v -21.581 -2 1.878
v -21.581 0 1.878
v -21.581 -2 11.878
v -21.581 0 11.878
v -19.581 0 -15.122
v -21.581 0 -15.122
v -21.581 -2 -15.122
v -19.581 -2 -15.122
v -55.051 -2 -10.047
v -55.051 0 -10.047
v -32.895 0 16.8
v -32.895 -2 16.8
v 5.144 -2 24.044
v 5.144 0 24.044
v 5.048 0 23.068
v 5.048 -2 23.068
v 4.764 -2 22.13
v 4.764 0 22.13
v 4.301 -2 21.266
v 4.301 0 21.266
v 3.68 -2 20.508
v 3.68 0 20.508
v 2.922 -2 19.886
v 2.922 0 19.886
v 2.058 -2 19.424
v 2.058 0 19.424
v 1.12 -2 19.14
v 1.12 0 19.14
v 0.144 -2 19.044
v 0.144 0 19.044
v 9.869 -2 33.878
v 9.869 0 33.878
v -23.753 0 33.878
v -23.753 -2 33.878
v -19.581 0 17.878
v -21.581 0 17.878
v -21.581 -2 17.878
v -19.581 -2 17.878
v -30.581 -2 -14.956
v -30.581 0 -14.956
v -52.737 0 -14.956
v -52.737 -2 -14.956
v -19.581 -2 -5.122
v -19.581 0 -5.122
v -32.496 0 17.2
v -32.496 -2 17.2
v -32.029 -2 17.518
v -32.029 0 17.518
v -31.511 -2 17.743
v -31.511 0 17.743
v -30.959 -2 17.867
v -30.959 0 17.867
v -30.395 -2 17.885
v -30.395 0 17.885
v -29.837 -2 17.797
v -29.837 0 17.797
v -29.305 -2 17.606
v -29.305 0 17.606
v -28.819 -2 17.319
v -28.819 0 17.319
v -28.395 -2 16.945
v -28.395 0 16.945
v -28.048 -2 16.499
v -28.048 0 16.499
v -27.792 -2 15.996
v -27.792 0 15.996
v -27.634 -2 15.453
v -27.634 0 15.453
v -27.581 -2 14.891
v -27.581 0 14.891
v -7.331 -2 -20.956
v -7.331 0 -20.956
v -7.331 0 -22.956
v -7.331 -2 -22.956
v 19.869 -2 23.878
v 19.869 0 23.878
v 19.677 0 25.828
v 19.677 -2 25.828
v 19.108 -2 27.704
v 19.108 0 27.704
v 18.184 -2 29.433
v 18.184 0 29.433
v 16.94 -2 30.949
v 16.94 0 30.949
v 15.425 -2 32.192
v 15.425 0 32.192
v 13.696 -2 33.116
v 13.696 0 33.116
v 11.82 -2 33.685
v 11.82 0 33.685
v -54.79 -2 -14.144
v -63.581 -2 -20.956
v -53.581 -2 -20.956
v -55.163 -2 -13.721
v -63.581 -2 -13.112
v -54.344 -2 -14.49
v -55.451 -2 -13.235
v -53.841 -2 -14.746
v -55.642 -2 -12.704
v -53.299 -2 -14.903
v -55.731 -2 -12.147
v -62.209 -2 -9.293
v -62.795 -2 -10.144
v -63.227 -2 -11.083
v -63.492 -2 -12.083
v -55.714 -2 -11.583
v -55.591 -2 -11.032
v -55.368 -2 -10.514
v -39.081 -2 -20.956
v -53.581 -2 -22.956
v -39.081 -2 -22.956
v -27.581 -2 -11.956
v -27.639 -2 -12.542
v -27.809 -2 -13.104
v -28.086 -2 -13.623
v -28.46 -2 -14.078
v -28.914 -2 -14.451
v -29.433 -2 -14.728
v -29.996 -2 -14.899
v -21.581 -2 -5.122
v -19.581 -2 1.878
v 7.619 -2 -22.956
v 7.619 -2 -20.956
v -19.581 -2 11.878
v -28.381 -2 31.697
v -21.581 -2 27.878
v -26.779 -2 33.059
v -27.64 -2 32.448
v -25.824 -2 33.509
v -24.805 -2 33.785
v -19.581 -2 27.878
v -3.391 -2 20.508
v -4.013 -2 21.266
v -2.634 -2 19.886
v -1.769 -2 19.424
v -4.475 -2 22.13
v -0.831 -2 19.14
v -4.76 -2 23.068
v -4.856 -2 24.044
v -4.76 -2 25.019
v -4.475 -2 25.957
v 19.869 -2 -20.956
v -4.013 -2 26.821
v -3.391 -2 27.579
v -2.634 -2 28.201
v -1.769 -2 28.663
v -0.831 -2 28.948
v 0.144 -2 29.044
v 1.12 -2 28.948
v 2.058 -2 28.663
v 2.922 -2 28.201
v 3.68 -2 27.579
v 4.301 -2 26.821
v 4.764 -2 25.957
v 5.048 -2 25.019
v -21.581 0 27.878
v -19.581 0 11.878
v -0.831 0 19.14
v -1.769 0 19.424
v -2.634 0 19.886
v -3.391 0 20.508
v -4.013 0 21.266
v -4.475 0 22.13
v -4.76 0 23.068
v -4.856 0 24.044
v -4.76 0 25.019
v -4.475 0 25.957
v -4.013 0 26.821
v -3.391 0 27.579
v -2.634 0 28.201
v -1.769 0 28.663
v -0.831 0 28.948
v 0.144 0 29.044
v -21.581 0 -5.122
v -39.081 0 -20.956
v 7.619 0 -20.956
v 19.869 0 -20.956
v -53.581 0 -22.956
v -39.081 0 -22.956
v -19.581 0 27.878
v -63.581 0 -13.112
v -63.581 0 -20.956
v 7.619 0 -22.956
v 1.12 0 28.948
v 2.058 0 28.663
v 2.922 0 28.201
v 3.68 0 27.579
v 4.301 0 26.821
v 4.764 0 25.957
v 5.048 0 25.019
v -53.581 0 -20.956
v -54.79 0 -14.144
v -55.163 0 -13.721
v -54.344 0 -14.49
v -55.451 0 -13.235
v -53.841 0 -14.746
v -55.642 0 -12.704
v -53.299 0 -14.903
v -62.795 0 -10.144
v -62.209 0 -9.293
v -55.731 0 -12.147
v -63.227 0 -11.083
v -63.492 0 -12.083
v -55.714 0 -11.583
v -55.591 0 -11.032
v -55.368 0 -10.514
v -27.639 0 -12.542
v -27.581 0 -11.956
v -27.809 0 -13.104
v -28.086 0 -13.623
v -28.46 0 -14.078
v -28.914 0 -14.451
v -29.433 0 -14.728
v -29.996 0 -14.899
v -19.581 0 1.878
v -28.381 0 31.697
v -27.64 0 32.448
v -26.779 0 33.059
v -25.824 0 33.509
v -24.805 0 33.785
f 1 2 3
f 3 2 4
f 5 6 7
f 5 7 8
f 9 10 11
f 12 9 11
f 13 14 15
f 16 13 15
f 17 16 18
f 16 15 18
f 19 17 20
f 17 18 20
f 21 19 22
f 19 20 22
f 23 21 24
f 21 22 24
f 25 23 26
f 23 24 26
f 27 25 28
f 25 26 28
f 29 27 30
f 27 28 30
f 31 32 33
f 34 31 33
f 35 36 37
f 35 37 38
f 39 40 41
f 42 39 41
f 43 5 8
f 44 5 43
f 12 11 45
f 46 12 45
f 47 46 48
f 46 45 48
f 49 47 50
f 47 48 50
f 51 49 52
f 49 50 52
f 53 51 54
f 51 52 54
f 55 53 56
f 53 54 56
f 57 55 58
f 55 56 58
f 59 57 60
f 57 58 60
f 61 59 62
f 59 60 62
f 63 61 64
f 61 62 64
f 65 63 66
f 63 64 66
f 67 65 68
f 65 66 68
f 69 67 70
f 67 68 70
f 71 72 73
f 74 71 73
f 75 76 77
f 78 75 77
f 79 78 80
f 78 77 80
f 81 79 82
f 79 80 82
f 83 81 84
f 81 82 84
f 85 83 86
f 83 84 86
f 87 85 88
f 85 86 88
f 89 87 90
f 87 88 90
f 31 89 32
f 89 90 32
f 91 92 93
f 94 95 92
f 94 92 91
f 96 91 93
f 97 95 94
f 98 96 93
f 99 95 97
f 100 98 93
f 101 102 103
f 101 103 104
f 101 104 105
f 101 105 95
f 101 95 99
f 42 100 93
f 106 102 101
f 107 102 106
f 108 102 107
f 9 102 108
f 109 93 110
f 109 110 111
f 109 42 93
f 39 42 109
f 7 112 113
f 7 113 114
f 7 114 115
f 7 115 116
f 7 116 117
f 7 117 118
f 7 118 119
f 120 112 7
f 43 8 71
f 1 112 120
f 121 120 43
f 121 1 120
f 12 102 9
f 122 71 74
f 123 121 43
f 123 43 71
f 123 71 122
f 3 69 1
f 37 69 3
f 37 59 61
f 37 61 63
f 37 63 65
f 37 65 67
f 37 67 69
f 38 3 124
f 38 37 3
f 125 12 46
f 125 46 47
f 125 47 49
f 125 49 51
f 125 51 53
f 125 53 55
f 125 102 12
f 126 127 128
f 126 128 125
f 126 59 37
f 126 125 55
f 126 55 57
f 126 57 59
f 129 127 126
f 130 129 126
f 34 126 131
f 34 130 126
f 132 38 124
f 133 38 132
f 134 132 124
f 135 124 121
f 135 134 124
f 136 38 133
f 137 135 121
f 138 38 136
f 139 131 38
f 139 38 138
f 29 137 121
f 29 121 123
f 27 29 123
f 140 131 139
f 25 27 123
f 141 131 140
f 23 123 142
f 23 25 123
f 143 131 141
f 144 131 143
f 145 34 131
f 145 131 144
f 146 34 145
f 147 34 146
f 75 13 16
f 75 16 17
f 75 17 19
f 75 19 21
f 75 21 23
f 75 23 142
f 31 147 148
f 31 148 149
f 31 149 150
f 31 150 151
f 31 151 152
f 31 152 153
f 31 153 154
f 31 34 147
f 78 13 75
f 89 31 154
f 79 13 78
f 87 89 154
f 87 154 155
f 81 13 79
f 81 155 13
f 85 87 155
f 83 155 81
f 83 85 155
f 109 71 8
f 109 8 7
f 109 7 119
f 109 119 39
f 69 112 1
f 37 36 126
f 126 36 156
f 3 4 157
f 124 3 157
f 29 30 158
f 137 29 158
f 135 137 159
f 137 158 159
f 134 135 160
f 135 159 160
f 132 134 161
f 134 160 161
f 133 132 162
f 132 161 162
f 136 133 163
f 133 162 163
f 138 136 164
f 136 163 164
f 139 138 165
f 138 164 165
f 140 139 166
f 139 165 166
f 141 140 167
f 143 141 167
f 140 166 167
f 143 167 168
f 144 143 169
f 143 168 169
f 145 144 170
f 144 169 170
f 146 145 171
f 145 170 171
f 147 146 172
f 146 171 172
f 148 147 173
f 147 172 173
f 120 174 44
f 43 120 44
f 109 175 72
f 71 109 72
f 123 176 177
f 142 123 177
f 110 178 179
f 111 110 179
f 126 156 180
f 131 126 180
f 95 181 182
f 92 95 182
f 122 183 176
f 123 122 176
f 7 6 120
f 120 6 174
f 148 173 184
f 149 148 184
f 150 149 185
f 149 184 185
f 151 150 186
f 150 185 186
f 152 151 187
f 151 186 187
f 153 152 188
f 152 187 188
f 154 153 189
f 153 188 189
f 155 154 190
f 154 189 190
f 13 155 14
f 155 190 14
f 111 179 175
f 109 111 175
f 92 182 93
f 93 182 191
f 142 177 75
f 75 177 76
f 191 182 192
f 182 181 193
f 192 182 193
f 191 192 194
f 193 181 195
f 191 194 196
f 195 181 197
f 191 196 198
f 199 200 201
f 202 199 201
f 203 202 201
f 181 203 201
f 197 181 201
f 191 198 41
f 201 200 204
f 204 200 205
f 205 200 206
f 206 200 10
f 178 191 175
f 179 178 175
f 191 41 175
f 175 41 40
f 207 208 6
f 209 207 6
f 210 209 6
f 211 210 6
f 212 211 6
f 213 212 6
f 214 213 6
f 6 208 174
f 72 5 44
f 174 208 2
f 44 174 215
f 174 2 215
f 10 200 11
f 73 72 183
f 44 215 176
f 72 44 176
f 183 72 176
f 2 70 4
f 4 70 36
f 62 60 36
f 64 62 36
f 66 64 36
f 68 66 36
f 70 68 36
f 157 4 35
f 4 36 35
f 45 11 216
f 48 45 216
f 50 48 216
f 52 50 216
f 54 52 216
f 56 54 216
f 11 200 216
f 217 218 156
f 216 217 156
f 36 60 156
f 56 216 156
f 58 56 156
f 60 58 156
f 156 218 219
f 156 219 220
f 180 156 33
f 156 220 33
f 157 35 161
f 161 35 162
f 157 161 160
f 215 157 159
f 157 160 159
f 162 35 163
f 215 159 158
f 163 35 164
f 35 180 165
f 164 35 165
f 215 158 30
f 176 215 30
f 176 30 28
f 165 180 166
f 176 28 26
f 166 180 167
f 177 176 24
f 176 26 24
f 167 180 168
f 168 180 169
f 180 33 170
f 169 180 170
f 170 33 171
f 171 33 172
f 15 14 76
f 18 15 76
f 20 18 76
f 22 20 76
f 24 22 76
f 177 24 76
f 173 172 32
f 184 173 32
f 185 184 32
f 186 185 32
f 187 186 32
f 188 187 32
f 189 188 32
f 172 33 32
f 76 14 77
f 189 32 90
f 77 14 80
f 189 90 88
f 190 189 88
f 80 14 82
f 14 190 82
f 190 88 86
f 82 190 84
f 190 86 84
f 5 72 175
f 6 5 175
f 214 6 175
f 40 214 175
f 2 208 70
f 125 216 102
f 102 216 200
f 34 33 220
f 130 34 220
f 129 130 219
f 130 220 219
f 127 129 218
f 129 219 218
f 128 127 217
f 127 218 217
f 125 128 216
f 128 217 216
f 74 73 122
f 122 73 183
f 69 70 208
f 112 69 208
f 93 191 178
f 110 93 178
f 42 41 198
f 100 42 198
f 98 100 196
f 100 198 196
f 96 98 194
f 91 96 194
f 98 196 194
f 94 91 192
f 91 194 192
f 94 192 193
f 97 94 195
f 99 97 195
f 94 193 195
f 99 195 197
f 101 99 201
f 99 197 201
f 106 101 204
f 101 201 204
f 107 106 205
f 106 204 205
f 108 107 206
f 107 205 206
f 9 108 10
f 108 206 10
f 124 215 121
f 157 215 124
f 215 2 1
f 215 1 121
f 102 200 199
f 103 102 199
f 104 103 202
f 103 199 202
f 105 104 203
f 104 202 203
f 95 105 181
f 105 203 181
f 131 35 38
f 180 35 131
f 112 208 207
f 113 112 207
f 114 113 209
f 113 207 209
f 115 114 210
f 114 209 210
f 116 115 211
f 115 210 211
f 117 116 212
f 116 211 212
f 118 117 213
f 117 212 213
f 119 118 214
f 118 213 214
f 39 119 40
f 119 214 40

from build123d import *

# Parameters (mm, degrees)
F0_W     = 2
F0_H     = 10
F1_DEPTH = 2


with BuildPart() as f1:
    # F0 (on Front) → F1 (new body)
    with BuildSketch(Plane.XZ):
        with BuildLine():
            Line((0.144111, 33.877513), (-19.580889, 33.877513))
            Line((-19.580889, 33.877513), (-21.580889, 33.877513))
            Line((-21.580889, 33.877513), (-23.753139, 33.877513))
            ThreePointArc((-23.753139, 33.877513), (-26.311046, 33.304953), (-28.380769, 31.696549))
            Line((-28.380769, 31.696549), (-62.208519, -9.293453))
            ThreePointArc((-62.208519, -9.293453), (-63.227382, -11.083423), (-63.580889, -13.112489))
            Line((-63.580889, -13.112489), (-63.580889, -20.95639))
            Line((-63.580889, -20.95639), (-53.580889, -20.95639))
            Line((-53.580889, -20.95639), (-53.580889, -22.95639))
            Line((-53.580889, -22.95639), (-39.080889, -22.95639))
            Line((-39.080889, -22.95639), (-39.080889, -20.95639))
            Line((-39.080889, -20.95639), (-21.580889, -20.95639))
            Line((-21.580889, -20.95639), (-7.330889, -20.95639))
            Line((-7.330889, -20.95639), (-7.330889, -21.122487))
            Line((-7.330889, -21.122487), (-7.330889, -22.95639))
            Line((-7.330889, -22.95639), (0.144111, -22.95639))
            Line((0.144111, -22.95639), (0.144111, 19.04361))
            ThreePointArc((0.144111, 19.04361), (-4.855889, 24.04361), (0.144111, 29.04361))
            Line((0.144111, 29.04361), (0.144111, 33.877513))
        make_face()
        with BuildLine():
            Line((-30.580889, -14.95639), (-52.737117, -14.95639))
            ThreePointArc((-52.737117, -14.95639), (-55.450837, -13.235344), (-55.050932, -10.046872))
            Line((-55.050932, -10.046872), (-32.894704, 16.800431))
            ThreePointArc((-32.894704, 16.800431), (-29.566356, 17.714159), (-27.580889, 14.890912))
            Line((-27.580889, 14.890912), (-27.580889, -11.95639))
            ThreePointArc((-27.580889, -11.95639), (-28.459568, -14.077711), (-30.580889, -14.95639))
        make_face(mode=Mode.SUBTRACT)
        with Locations((-20.580889, -10.122487)):
            Rectangle(F0_W, F0_H, mode=Mode.SUBTRACT)
        with Locations((-20.580889, 6.877513)):
            Rectangle(F0_W, F0_H, mode=Mode.SUBTRACT)
        with Locations((-20.580889, 22.877513)):
            Rectangle(F0_W, F0_H, mode=Mode.SUBTRACT)
        with BuildLine():
            Line((9.869111, 33.877513), (0.144111, 33.877513))
            Line((0.144111, 33.877513), (0.144111, 29.04361))
            ThreePointArc((0.144111, 29.04361), (3.679645, 27.579143), (5.144111, 24.04361))
            ThreePointArc((5.144111, 24.04361), (3.679645, 20.508076), (0.144111, 19.04361))
            Line((0.144111, 19.04361), (0.144111, -22.95639))
            Line((0.144111, -22.95639), (7.619111, -22.95639))
            Line((7.619111, -22.95639), (7.619111, -21.122487))
            Line((7.619111, -21.122487), (7.619111, -20.95639))
            Line((7.619111, -20.95639), (19.869111, -20.95639))
            Line((19.869111, -20.95639), (19.869111, -15.122487))
            Line((19.869111, -15.122487), (19.869111, -5.122487))
            Line((19.869111, -5.122487), (19.869111, 1.877513))
            Line((19.869111, 1.877513), (19.869111, 11.877513))
            Line((19.869111, 11.877513), (19.869111, 17.877513))
            Line((19.869111, 17.877513), (19.869111, 23.877513))
            ThreePointArc((19.869111, 23.877513), (16.940179, 30.948581), (9.869111, 33.877513))
        make_face()
    extrude(amount=F1_DEPTH)


solid = f1.part
